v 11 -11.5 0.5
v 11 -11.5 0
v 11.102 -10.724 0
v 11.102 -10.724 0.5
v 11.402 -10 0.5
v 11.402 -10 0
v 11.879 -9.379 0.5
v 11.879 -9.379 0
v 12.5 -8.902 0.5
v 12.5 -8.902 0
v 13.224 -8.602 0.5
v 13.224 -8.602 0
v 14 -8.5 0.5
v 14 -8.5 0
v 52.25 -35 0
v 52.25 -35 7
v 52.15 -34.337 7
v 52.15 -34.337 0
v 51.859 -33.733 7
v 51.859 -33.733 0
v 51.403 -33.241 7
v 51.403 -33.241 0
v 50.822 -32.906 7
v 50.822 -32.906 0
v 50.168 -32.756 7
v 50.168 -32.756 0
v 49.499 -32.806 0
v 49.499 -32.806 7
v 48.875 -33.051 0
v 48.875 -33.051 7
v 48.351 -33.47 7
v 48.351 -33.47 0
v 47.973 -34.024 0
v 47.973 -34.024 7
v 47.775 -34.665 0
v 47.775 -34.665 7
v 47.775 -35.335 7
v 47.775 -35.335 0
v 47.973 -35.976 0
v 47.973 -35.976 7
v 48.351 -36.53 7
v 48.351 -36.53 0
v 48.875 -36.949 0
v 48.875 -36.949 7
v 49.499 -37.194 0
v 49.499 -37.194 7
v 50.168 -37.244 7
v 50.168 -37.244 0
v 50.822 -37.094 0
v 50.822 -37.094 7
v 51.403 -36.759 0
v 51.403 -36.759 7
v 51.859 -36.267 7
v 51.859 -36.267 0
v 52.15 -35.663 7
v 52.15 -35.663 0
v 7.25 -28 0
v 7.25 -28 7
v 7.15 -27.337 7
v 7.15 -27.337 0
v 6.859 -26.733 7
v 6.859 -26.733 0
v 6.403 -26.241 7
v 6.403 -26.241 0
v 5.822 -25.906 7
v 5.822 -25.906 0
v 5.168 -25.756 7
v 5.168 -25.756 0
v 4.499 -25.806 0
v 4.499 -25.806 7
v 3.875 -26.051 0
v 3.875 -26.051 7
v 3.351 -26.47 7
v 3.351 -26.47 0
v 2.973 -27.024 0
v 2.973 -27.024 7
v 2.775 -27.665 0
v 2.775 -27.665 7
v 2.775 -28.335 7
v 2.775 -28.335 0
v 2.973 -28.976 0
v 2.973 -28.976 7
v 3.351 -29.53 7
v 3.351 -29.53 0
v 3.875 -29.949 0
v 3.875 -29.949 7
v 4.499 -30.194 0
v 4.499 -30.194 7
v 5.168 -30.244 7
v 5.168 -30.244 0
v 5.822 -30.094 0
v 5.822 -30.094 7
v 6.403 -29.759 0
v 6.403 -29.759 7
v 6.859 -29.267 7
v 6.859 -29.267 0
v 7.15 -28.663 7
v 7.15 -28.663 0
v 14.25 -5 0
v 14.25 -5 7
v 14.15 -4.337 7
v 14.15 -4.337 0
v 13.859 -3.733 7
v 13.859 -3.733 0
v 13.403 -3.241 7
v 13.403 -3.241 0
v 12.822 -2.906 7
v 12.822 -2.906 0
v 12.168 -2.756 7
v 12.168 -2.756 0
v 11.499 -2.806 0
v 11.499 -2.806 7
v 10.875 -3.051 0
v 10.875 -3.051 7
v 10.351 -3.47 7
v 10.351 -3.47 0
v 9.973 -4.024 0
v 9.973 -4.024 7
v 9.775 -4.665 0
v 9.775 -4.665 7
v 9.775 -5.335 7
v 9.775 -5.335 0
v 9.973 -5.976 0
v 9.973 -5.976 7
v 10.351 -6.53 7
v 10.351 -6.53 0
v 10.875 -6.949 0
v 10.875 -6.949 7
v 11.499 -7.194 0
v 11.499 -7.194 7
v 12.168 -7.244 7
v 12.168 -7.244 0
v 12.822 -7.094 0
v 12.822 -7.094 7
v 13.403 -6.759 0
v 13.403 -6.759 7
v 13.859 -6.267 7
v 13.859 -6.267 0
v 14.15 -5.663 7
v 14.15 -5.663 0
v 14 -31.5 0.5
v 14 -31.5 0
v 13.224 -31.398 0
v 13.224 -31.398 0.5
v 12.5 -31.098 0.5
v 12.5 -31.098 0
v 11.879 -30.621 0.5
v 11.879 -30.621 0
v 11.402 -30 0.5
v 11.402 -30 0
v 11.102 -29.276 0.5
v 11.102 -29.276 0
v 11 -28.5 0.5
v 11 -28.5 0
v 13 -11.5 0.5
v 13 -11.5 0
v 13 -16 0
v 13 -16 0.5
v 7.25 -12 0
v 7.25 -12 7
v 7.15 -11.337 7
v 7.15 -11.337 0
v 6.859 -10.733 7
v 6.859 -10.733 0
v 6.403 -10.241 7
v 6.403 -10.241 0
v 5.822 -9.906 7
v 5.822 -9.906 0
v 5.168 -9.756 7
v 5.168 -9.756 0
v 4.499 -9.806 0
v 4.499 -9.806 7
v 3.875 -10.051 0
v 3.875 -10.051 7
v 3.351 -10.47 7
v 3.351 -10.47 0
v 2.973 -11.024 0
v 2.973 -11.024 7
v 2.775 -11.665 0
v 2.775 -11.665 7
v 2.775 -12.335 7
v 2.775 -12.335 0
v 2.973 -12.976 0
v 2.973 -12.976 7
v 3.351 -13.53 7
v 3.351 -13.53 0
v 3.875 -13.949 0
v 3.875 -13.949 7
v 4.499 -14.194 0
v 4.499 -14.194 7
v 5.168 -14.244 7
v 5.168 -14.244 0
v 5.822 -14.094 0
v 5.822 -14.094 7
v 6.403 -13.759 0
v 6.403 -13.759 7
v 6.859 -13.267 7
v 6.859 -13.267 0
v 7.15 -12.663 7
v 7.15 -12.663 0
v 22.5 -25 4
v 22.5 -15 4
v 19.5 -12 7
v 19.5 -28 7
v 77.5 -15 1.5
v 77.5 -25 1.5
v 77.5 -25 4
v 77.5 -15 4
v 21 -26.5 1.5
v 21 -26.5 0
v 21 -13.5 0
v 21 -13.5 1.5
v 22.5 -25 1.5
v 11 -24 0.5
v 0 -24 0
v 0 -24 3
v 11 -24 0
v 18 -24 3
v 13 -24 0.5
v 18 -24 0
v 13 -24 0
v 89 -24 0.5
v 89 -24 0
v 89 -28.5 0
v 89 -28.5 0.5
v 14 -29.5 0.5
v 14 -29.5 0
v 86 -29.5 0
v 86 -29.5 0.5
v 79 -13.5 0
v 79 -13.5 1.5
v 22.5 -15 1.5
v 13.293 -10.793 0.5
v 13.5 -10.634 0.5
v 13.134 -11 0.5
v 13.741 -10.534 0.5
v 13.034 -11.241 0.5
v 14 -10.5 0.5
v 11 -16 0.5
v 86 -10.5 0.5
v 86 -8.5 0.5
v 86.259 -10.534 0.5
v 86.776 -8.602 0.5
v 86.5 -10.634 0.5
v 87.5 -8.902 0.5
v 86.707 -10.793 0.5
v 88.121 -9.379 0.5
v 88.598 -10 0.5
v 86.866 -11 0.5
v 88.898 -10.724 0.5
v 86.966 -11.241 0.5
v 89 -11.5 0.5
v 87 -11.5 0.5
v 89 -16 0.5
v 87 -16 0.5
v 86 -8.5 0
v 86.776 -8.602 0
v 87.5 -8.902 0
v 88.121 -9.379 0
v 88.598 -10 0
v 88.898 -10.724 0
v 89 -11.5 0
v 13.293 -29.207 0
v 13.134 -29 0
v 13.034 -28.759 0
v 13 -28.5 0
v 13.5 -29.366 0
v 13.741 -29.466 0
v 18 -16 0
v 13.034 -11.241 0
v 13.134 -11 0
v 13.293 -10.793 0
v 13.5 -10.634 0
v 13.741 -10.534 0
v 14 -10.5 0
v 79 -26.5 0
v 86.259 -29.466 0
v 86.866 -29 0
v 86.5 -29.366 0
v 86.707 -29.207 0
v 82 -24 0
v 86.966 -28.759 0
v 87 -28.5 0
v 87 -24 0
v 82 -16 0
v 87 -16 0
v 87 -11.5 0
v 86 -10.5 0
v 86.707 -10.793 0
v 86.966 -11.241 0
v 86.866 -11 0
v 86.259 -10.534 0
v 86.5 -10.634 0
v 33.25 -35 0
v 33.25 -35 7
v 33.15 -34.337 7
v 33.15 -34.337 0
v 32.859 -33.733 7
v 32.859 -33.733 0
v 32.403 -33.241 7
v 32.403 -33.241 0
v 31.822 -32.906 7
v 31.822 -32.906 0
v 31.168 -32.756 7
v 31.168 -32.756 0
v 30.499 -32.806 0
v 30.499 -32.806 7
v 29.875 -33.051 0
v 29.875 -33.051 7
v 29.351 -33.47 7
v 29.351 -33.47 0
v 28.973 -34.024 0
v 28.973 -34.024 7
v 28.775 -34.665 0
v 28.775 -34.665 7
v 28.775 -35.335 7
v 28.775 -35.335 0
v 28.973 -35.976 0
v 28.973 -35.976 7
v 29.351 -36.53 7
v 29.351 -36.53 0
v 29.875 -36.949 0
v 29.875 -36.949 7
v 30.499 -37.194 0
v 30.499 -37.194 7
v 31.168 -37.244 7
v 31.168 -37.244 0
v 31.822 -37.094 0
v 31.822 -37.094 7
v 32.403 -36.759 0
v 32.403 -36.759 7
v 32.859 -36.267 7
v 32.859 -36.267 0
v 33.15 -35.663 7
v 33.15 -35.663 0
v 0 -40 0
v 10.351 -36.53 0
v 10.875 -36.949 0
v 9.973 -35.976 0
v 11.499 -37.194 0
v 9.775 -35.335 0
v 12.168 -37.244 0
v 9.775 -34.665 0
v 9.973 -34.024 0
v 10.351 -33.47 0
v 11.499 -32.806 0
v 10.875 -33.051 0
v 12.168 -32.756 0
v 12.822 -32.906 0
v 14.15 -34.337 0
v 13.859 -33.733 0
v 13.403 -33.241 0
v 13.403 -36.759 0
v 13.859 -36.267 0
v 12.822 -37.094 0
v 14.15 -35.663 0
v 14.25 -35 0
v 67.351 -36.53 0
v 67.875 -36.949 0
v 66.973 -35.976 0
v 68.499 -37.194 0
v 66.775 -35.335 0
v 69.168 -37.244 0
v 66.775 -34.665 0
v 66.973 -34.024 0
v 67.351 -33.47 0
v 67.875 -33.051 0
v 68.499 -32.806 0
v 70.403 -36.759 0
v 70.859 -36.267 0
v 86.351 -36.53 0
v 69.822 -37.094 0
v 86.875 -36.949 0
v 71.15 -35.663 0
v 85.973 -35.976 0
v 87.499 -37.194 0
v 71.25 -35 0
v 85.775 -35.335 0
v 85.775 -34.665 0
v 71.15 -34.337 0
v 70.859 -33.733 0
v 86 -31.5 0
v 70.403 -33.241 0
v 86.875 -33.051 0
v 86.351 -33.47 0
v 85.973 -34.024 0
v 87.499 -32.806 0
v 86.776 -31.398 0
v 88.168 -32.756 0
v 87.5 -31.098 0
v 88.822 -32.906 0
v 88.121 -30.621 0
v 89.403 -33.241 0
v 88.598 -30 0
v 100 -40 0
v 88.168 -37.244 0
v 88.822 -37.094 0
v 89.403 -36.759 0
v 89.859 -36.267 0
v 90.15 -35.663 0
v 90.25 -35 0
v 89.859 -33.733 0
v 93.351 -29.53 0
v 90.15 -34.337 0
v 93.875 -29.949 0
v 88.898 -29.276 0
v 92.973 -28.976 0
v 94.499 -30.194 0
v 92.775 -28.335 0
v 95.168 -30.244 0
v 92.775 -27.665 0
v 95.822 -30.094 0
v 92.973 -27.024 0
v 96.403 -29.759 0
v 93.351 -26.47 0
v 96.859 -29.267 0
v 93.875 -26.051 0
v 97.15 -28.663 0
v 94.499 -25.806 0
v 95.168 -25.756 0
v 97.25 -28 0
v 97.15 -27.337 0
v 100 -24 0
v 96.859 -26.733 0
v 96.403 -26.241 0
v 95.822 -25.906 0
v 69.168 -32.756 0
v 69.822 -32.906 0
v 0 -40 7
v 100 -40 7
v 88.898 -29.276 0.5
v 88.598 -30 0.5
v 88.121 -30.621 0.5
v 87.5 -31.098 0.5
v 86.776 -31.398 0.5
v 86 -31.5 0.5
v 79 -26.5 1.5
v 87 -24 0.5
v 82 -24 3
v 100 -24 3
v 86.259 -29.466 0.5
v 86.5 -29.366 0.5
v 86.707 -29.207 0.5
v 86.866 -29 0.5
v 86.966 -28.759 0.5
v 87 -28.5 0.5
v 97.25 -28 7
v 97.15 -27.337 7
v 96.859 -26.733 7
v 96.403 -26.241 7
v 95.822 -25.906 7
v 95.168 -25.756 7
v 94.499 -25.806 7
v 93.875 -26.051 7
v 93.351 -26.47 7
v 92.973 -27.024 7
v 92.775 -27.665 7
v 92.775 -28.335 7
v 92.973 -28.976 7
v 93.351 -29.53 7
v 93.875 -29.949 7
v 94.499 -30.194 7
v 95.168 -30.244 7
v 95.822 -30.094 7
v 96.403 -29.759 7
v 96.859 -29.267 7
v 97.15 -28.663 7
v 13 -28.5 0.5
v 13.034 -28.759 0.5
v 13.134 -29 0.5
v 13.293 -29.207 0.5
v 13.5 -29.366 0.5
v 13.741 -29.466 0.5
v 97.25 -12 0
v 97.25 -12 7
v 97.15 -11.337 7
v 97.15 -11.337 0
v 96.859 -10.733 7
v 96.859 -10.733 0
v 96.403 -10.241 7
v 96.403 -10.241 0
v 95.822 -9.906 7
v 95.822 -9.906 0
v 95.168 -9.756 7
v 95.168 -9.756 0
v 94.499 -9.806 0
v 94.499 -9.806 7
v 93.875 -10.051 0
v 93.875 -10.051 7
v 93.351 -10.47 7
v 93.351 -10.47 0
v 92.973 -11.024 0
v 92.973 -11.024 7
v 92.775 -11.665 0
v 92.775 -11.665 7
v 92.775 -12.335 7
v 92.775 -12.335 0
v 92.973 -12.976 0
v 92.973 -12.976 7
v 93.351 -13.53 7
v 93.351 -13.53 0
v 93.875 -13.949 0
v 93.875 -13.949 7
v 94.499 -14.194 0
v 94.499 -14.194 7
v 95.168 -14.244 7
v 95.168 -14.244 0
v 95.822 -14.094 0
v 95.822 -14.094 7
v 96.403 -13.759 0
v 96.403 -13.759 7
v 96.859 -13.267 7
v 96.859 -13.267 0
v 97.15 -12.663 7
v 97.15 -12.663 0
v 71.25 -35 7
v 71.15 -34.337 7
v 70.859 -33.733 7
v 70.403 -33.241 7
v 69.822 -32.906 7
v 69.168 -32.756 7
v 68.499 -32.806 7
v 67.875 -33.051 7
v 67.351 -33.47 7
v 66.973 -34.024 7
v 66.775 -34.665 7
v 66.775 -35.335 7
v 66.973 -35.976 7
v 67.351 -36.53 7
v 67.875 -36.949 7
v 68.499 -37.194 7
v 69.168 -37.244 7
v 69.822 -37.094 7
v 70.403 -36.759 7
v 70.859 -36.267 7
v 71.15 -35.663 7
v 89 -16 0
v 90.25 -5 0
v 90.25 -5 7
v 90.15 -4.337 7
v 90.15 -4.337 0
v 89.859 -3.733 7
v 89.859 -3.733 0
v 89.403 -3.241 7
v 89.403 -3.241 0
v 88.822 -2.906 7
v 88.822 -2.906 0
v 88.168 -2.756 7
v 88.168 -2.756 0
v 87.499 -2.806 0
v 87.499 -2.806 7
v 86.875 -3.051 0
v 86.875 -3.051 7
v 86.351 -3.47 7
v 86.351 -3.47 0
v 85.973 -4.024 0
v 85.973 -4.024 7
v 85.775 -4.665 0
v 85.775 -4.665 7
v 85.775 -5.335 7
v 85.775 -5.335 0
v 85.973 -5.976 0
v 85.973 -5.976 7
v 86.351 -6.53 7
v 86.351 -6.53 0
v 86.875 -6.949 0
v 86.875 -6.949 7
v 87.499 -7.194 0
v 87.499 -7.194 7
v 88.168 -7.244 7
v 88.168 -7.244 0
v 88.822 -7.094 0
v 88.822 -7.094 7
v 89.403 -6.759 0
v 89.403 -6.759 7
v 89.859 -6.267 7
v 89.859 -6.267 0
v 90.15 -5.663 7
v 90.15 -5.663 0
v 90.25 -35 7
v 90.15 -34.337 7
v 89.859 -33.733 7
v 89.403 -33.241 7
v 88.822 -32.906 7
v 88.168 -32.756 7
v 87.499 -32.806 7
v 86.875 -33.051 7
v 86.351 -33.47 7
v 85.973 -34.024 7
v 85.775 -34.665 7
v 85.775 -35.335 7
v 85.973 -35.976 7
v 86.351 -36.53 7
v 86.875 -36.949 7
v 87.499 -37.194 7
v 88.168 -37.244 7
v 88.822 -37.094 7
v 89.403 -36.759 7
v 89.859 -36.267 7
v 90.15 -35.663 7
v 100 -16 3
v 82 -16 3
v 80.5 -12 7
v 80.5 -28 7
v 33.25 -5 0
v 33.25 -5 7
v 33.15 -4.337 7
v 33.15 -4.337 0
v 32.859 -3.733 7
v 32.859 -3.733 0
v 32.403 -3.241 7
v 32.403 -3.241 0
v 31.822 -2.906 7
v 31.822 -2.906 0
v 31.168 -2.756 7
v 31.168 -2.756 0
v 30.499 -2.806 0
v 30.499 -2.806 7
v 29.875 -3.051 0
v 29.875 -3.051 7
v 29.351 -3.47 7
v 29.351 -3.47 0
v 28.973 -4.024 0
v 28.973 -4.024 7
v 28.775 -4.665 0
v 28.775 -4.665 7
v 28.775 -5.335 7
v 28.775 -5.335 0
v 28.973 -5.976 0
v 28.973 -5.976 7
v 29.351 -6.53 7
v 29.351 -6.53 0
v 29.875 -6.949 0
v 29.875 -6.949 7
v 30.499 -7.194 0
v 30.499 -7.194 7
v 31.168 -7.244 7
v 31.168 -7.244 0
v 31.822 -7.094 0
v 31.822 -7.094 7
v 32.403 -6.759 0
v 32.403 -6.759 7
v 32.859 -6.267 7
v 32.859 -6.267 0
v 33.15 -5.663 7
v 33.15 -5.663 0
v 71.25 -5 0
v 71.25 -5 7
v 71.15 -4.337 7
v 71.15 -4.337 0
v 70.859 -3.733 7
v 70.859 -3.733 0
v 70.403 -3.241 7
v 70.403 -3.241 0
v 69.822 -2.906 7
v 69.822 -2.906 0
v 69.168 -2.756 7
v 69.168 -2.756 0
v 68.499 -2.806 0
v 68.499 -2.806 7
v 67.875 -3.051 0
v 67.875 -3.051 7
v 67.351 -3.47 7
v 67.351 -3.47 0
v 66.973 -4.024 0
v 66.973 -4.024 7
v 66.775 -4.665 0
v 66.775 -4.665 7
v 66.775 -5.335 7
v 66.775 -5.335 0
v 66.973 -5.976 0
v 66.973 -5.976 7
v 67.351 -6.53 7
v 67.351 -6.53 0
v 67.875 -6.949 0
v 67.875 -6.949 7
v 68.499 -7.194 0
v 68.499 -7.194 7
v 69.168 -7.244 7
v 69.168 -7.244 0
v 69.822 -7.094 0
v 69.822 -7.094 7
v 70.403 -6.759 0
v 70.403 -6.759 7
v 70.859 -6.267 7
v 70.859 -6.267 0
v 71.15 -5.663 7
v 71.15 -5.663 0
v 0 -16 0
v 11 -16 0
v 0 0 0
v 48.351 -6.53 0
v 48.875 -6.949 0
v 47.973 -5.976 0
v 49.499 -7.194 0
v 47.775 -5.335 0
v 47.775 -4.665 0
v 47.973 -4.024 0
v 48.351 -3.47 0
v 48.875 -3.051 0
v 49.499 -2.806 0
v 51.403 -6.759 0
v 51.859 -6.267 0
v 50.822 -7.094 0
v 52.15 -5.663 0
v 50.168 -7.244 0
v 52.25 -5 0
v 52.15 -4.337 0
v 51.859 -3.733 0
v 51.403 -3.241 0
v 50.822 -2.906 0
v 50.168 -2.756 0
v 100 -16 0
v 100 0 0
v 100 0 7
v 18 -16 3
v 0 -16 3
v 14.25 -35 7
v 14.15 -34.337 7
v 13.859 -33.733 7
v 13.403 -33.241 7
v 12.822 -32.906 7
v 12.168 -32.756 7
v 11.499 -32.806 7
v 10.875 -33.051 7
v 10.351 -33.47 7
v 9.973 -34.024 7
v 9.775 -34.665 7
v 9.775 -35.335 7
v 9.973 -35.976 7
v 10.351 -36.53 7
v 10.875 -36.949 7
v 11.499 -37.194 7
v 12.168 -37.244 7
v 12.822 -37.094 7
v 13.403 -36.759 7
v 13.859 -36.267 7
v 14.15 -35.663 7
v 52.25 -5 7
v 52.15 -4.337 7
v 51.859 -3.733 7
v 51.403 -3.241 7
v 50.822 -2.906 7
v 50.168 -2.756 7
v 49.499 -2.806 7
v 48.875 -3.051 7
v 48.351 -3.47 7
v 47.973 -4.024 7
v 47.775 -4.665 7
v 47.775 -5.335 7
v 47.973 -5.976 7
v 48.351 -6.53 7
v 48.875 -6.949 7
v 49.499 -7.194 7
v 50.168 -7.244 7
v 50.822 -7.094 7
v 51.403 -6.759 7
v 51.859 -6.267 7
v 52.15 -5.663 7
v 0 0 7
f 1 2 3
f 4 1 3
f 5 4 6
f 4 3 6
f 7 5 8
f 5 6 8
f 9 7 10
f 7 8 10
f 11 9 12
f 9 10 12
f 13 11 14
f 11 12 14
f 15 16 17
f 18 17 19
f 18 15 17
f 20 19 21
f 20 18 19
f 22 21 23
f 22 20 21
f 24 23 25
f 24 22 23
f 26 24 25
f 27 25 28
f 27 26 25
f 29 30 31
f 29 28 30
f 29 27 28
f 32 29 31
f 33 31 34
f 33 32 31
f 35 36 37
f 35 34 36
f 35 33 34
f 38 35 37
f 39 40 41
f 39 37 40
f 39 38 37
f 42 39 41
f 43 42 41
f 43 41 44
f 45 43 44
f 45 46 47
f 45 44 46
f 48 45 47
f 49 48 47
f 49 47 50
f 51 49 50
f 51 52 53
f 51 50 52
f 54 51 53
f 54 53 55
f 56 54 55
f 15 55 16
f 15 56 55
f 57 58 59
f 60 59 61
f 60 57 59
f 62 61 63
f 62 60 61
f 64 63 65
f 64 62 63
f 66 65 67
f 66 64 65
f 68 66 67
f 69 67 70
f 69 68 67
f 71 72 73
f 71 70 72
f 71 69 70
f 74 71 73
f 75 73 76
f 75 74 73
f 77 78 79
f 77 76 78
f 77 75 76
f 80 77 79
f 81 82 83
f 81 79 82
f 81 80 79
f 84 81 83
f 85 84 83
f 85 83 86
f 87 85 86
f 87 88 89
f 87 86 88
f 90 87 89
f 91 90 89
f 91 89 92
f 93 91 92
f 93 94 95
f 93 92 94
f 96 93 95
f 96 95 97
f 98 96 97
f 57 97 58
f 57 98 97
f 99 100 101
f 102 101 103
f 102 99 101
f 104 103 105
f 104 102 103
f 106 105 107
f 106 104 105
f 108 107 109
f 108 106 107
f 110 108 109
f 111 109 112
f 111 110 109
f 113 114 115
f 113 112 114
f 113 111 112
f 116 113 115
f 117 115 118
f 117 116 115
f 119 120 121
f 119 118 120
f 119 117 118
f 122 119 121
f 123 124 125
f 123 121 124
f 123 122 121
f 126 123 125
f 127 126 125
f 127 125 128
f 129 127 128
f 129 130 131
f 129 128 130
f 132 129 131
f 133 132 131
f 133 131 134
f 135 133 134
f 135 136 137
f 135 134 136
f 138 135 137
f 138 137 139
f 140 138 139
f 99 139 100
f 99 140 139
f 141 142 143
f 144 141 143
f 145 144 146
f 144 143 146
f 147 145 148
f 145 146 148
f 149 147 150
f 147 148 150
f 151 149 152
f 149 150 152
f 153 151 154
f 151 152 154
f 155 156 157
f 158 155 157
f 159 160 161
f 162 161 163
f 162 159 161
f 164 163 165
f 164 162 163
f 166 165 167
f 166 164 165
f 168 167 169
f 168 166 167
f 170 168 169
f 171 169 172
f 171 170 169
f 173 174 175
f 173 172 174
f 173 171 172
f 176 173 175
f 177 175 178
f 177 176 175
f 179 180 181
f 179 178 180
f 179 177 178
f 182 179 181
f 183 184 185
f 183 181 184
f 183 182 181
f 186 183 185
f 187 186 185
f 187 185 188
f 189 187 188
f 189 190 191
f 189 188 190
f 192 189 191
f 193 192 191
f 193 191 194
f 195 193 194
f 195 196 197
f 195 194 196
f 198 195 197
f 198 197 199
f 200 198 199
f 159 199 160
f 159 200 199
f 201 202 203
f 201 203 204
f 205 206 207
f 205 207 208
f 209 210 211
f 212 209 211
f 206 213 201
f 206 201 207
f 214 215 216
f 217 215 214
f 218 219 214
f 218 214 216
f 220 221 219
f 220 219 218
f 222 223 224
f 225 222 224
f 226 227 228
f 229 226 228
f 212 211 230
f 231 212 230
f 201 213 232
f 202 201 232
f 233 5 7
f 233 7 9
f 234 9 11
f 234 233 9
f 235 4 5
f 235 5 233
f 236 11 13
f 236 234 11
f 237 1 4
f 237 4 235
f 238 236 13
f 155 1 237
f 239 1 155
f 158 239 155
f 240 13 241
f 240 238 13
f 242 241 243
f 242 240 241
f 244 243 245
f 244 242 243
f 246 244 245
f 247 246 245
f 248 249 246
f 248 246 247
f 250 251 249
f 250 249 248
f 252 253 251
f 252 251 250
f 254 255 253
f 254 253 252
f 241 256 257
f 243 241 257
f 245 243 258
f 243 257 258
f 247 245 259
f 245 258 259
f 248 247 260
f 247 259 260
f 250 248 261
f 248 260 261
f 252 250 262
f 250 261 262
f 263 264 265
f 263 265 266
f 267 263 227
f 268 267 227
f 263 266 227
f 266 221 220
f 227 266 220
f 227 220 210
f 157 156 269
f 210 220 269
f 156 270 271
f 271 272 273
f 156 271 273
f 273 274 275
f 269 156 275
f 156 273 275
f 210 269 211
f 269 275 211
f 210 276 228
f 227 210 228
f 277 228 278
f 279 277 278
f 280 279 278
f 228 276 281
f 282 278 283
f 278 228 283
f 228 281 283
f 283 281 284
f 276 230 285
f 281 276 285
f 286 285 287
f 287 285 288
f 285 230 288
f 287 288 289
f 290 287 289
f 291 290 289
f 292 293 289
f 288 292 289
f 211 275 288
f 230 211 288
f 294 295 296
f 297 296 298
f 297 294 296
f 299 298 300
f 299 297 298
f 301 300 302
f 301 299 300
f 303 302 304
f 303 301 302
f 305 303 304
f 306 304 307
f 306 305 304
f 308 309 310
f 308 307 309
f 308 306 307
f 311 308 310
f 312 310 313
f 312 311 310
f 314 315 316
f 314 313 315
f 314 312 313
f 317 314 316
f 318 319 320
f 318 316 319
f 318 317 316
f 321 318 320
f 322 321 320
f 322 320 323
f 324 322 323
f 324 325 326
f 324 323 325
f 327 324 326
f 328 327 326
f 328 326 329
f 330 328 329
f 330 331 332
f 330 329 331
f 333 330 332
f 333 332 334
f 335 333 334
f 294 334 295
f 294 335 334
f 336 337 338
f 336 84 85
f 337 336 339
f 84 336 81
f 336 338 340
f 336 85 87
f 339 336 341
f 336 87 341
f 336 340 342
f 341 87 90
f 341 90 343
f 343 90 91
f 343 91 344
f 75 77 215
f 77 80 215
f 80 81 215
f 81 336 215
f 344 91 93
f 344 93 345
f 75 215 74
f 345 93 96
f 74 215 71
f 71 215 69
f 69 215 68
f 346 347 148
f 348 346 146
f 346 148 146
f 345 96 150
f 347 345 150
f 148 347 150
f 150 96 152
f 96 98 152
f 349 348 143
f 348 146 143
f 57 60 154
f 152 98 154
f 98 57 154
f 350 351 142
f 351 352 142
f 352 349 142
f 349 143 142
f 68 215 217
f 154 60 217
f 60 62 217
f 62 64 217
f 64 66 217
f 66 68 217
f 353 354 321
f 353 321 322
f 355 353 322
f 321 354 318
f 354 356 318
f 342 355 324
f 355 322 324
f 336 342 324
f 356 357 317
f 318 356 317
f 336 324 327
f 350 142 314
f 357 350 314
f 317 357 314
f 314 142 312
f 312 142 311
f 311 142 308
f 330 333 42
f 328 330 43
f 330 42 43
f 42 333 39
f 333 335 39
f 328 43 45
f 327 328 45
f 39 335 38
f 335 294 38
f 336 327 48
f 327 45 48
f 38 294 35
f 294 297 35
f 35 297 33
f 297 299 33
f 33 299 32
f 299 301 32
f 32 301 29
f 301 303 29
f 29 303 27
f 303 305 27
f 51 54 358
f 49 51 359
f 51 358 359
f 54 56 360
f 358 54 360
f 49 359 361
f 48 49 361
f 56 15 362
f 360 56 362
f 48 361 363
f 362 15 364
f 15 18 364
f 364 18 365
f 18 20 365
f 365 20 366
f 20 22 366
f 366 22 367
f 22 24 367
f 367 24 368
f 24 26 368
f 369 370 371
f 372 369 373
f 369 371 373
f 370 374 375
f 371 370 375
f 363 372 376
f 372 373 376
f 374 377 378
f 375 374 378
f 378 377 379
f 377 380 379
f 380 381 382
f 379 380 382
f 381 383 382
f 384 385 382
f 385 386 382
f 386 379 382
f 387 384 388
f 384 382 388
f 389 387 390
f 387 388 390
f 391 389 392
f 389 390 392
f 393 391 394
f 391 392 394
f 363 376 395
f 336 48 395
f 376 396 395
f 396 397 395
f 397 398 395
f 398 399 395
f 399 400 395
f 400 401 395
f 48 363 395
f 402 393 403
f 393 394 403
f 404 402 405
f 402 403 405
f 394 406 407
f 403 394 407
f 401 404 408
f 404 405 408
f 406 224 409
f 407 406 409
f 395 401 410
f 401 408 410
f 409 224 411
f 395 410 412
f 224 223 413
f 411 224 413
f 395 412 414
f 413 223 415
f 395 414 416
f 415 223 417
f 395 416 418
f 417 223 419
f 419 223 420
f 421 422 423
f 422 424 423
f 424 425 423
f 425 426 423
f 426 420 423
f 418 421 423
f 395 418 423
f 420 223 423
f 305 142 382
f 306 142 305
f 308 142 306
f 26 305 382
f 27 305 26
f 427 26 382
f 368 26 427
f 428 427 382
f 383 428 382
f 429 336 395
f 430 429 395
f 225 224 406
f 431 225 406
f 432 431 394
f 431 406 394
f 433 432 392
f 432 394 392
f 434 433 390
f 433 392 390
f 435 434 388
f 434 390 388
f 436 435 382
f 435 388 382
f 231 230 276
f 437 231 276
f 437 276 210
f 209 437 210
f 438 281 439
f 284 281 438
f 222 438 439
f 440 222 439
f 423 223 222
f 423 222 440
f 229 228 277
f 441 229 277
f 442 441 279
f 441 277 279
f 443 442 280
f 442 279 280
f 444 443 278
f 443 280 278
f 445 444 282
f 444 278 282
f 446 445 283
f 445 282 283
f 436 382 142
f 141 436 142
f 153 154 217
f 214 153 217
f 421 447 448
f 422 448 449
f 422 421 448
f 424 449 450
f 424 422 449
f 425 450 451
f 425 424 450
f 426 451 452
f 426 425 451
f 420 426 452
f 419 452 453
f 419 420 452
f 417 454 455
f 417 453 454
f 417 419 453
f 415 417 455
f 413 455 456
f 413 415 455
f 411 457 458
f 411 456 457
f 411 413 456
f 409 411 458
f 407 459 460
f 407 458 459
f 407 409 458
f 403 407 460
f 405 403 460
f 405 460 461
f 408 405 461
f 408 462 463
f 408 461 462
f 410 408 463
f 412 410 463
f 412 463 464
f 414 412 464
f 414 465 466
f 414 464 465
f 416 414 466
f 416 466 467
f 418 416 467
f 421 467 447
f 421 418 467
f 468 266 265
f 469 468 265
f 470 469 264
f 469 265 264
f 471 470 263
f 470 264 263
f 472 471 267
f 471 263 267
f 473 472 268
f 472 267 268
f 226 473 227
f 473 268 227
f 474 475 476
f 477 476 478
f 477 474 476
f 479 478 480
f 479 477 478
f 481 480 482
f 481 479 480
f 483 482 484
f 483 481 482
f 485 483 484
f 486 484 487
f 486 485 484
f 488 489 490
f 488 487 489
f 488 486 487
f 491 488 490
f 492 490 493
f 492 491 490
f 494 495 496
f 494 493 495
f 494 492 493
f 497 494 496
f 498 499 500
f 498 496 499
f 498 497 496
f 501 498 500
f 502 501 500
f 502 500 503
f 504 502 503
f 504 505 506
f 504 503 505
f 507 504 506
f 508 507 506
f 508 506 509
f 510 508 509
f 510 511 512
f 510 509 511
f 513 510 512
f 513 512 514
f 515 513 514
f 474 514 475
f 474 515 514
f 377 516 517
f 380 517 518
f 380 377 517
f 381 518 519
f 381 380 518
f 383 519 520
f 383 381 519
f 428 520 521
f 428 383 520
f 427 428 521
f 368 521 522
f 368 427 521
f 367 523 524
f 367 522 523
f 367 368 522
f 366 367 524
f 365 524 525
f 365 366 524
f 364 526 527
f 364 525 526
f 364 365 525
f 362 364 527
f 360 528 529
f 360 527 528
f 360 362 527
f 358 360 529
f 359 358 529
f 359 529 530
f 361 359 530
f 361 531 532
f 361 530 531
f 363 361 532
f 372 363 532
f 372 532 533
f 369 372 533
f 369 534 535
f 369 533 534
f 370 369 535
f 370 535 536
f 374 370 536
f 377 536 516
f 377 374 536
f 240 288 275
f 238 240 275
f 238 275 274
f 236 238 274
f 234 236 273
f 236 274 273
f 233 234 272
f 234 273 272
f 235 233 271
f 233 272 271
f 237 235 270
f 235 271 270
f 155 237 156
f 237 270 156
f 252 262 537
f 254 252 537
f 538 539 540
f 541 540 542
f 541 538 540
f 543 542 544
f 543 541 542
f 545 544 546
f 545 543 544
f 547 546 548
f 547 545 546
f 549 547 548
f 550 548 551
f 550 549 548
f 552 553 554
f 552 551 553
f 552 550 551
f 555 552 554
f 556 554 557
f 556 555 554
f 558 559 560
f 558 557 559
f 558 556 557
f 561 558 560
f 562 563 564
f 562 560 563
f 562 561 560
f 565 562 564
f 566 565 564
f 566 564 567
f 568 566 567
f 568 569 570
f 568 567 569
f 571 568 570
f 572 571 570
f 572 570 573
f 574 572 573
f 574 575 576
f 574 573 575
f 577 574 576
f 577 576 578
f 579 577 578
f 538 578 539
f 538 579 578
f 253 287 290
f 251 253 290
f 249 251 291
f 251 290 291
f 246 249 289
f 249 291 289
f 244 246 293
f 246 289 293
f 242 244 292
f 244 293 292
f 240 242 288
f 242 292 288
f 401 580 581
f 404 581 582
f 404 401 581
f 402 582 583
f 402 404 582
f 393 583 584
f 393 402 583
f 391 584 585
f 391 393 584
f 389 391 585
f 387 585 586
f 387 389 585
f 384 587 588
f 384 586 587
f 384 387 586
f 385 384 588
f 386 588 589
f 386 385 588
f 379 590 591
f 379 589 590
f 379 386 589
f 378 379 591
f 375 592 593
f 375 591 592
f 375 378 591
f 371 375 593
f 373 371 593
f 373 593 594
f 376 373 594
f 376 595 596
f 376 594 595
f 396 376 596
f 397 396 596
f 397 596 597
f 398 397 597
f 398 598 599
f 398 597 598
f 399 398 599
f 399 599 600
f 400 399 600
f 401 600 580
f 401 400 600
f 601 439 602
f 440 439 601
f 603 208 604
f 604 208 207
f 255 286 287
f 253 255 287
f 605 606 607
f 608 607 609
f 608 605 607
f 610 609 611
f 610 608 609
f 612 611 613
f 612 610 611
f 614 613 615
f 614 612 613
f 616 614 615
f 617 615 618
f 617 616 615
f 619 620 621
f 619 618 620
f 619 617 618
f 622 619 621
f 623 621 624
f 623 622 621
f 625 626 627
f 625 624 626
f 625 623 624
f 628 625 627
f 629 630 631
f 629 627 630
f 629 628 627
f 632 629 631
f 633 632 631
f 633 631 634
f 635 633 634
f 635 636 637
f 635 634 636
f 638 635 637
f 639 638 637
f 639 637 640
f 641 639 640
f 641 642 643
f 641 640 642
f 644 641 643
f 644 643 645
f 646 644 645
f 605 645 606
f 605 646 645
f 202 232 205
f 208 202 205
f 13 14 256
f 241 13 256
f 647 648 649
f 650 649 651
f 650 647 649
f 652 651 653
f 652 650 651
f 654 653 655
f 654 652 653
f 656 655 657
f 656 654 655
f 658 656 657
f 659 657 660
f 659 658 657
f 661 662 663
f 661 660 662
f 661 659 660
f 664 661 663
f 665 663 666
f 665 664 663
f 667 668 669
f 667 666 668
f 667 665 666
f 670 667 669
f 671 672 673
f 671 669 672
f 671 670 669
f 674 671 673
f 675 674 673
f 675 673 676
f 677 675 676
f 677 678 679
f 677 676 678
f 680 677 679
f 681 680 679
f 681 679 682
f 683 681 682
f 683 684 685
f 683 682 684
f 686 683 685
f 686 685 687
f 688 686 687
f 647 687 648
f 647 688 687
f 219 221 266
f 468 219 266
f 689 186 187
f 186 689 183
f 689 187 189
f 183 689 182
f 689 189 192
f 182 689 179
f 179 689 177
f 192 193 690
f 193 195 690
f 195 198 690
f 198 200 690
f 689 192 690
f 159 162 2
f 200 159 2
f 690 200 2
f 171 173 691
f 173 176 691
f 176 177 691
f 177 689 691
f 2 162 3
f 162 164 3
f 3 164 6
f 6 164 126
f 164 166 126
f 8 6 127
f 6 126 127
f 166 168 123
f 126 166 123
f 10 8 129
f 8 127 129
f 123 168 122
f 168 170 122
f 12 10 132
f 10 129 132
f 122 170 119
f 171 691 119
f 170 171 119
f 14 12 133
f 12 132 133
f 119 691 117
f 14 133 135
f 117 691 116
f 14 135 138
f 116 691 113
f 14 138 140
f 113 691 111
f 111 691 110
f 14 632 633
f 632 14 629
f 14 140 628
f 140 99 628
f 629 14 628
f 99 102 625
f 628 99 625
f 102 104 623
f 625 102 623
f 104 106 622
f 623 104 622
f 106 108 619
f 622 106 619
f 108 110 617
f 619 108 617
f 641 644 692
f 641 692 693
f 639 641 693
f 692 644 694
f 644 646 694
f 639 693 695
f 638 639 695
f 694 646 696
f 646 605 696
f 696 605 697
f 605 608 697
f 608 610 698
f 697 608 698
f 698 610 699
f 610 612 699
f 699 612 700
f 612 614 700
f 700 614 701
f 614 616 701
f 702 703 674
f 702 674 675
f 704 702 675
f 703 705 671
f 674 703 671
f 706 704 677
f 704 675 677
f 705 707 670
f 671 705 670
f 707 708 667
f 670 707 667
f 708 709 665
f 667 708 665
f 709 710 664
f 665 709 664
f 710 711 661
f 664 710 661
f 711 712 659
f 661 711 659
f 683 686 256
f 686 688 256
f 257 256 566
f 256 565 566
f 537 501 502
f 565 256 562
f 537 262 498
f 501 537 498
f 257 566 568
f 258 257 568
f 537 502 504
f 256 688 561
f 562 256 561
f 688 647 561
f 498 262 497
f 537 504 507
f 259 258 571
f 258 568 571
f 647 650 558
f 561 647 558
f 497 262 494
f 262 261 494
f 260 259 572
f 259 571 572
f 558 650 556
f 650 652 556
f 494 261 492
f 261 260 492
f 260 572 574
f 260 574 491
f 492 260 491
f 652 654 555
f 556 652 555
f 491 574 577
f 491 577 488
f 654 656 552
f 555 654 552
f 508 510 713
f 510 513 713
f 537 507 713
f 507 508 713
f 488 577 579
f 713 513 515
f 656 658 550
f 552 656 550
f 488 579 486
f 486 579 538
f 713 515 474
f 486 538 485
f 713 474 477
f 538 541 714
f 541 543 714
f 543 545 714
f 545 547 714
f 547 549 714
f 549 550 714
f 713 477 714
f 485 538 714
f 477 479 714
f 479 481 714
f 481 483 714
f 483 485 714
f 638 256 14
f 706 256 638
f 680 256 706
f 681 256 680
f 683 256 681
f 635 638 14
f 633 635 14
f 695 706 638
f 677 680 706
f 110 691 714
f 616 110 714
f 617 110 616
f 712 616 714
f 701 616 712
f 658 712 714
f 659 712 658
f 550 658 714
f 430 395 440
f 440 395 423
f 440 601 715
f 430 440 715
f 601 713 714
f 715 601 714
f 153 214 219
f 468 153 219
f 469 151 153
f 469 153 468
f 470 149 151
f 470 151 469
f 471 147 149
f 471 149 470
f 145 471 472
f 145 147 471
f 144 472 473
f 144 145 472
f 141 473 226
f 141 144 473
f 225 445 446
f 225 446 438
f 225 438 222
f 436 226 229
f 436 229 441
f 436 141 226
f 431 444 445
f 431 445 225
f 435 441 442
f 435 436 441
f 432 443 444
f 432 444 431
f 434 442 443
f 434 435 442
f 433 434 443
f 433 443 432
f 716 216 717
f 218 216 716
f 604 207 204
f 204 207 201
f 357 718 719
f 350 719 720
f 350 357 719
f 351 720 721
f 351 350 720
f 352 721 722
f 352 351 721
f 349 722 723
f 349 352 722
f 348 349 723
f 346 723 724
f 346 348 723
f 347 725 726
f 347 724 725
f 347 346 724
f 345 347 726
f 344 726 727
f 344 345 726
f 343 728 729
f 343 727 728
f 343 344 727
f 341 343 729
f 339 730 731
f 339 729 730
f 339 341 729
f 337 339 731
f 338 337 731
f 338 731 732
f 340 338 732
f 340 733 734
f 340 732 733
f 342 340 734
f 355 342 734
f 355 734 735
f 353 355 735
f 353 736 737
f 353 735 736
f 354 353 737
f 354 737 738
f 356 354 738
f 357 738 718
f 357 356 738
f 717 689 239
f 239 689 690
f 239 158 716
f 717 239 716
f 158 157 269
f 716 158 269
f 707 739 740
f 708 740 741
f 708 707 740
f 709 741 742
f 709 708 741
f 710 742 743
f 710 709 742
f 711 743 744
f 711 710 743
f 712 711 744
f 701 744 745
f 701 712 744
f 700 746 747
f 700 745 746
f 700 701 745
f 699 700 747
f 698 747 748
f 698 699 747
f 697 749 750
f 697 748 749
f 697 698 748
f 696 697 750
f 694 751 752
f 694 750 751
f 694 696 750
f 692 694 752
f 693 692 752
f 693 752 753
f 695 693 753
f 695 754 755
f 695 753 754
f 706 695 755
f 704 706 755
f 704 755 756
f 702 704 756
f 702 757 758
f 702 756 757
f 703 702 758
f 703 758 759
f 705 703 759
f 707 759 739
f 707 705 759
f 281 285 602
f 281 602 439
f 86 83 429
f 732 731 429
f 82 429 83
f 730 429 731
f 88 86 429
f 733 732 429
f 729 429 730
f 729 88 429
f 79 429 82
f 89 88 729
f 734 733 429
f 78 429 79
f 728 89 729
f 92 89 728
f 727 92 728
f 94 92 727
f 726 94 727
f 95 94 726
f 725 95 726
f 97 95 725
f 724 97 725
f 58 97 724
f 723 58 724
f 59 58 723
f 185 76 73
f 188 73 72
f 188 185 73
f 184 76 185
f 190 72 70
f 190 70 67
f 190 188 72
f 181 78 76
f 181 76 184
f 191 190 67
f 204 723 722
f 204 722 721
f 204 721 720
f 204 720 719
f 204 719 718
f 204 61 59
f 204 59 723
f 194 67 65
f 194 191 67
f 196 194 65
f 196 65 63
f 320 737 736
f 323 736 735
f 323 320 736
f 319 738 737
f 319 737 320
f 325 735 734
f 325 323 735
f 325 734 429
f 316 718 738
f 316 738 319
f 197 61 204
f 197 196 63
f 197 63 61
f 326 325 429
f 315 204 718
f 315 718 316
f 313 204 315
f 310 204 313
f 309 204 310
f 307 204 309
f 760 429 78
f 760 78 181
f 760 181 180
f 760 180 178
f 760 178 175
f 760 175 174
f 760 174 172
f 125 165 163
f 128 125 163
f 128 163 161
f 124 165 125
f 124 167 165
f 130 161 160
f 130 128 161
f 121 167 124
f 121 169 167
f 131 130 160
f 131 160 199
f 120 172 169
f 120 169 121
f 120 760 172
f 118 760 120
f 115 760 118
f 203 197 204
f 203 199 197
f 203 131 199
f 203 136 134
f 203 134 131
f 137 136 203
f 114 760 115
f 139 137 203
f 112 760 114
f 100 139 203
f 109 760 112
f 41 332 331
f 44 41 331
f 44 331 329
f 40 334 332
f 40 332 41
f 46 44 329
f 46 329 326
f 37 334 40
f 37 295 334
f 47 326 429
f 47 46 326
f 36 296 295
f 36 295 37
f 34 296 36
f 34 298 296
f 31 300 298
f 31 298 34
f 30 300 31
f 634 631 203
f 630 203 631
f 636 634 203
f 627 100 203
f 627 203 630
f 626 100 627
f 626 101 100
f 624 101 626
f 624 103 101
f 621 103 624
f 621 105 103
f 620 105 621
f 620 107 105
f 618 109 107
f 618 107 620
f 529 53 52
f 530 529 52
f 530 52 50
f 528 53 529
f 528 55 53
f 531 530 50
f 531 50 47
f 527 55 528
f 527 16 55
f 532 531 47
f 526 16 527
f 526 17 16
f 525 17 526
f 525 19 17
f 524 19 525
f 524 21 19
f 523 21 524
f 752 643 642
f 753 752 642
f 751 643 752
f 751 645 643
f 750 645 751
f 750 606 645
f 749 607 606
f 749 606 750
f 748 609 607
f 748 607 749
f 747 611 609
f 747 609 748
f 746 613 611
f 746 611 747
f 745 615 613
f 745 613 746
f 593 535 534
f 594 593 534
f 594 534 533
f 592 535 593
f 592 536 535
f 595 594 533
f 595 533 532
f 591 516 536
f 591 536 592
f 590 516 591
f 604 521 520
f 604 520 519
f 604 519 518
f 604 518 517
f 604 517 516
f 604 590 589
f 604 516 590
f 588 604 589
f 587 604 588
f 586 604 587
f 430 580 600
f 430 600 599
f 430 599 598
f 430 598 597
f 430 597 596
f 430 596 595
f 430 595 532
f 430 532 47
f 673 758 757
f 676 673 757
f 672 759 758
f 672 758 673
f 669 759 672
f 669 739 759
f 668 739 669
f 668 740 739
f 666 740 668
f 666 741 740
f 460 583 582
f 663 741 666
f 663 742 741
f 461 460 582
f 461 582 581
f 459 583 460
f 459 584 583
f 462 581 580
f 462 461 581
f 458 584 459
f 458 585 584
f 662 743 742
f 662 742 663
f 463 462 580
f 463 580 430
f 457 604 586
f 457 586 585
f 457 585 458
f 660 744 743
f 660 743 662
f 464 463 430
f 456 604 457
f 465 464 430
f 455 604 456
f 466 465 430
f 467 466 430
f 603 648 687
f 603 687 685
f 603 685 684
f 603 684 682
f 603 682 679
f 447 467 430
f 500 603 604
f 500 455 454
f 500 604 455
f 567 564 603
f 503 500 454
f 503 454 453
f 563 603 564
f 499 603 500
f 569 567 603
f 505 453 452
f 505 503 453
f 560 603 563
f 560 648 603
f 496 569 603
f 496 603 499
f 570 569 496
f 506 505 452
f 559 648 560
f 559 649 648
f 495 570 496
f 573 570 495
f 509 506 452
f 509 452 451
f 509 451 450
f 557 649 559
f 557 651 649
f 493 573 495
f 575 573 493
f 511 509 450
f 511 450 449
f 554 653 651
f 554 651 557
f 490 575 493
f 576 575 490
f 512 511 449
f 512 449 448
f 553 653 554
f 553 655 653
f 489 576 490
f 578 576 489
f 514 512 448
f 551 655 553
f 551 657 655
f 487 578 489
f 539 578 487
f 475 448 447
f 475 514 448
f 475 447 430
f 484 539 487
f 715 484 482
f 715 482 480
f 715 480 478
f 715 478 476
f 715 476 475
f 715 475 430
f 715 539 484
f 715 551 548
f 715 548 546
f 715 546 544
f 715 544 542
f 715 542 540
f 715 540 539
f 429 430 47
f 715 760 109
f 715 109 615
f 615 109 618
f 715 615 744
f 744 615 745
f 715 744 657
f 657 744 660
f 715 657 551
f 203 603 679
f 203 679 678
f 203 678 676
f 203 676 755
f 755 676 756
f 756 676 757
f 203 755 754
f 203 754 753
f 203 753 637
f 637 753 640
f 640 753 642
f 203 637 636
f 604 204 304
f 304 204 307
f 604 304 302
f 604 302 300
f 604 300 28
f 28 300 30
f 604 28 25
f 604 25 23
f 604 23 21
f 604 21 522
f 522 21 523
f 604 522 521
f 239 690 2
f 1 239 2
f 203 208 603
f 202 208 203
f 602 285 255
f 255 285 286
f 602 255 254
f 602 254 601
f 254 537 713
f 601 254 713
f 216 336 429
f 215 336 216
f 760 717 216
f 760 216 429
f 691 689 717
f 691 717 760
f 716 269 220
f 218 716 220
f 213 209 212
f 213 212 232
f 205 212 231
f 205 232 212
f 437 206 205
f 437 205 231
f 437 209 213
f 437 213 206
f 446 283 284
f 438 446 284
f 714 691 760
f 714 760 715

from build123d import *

# Parameters (mm, degrees)
F0_W      = 100
F0_H      = 40
F1_DEPTH  = 7
F2_W      = 55
F2_H      = 10
F3_DEPTH  = 8
F4_SIZE   = 3
F5_R      = 2.25
F6_DEPTH  = 18.9
F7_W      = 18
F7_H      = 8
F8_DEPTH  = 3
F9_W      = 55
F9_H      = 10
F10_DEPTH = 1.5
F12_DEPTH = 0.5


# Not quite as in the source:
# - a feature names something its author has since deleted; it is built from what else it names


with BuildPart() as f1:
    # F0 (on Top) → F1 (new body)
    with BuildSketch(Plane.XY):
        with Locations((50, -20)):
            Rectangle(F0_W, F0_H)
    extrude(amount=F1_DEPTH)

    # F2 (on Top) → F3 (cut)
    with BuildSketch(Plane.XY):
        with Locations((50, -20)):
            Rectangle(F2_W, F2_H)
    extrude(amount=F3_DEPTH, mode=Mode.SUBTRACT)

    # F4
    f4_edges = [f1.edges().sort_by_distance(p)[0] for p in [
        (50, -15, 7),
        (22.5, -20, 7),
        (50, -25, 7),
        (77.5, -20, 7),
    ]]
    chamfer(f4_edges, length=F4_SIZE)

    # F5 (on Top) → F6 (cut)
    with BuildSketch(Plane.XY):
        with Locations((12, -35)):
            Circle(F5_R)
        with Locations((31, -35)):
            Circle(F5_R)
        with Locations((50, -35)):
            Circle(F5_R)
        with Locations((69, -35)):
            Circle(F5_R)
        with Locations((88, -35)):
            Circle(F5_R)
        with Locations((95, -28)):
            Circle(F5_R)
        with Locations((95, -12)):
            Circle(F5_R)
        with Locations((88, -5)):
            Circle(F5_R)
        with Locations((69, -5)):
            Circle(F5_R)
        with Locations((50, -5)):
            Circle(F5_R)
        with Locations((31, -5)):
            Circle(F5_R)
        with Locations((12, -5)):
            Circle(F5_R)
        with Locations((5, -12)):
            Circle(F5_R)
        with Locations((5, -28)):
            Circle(F5_R)
    extrude(amount=F6_DEPTH, mode=Mode.SUBTRACT)

    # F7 (on face) → F8 (cut)
    with BuildSketch(Plane(origin=(0, 0, 0), x_dir=(1, 0, 0), z_dir=(0, 0, -1))):
        with Locations((9, 20)):
            Rectangle(F7_W, F7_H)
        with Locations((91, 20)):
            Rectangle(F7_W, F7_H)
    extrude(amount=-F8_DEPTH, mode=Mode.SUBTRACT)

    # F9 (on face) → F10 (cut)
    with BuildSketch(Plane(origin=(0, 0, 0), x_dir=(1, 0, 0), z_dir=(0, 0, -1))):
        Polygon((21, 13.5), (77.5, 13.5), (79, 13.5), (79, 26.5), (21, 26.5), align=None)
        with Locations((50, 20)):
            Rectangle(F9_W, F9_H, mode=Mode.SUBTRACT)
    extrude(amount=-F10_DEPTH, mode=Mode.SUBTRACT)

    # F11 (on face) → F12 (cut)
    with BuildSketch(Plane(origin=(0, 0, 0), x_dir=(1, 0, 0), z_dir=(0, 0, -1))):
        with BuildLine():
            Line((14, 8.5), (16, 8.5))
            Line((16, 8.5), (84, 8.5))
            Line((84, 8.5), (86, 8.5))
            ThreePointArc((86, 8.5), (88.1213203436, 9.3786796564), (89, 11.5))
            Line((89, 11.5), (89, 16))
            Line((89, 16), (87, 16))
            Line((87, 16), (87, 11.5))
            ThreePointArc((87, 11.5), (86.7071067812, 10.7928932188), (86, 10.5))
            Line((86, 10.5), (84, 10.5))
            Line((84, 10.5), (16, 10.5))
            Line((16, 10.5), (14, 10.5))
            ThreePointArc((14, 10.5), (13.2928932188, 10.7928932188), (13, 11.5))
            Line((13, 11.5), (13, 16))
            Line((13, 16), (11, 16))
            Line((11, 16), (11, 11.5))
            ThreePointArc((11, 11.5), (11.8786796564, 9.3786796564), (14, 8.5))
        make_face()
        with BuildLine():
            Line((11, 28.5), (11, 24))
            Line((11, 24), (13, 24))
            Line((13, 24), (13, 28.5))
            ThreePointArc((13, 28.5), (13.2928932188, 29.2071067812), (14, 29.5))
            Line((14, 29.5), (16, 29.5))
            Line((16, 29.5), (84, 29.5))
            Line((84, 29.5), (86, 29.5))
            ThreePointArc((86, 29.5), (86.7071067812, 29.2071067812), (87, 28.5))
            Line((87, 28.5), (87, 24))
            Line((87, 24), (89, 24))
            Line((89, 24), (89, 28.5))
            ThreePointArc((89, 28.5), (88.1213203436, 30.6213203436), (86, 31.5))
            Line((86, 31.5), (84, 31.5))
            Line((84, 31.5), (16, 31.5))
            Line((16, 31.5), (14, 31.5))
            ThreePointArc((14, 31.5), (11.8786796564, 30.6213203436), (11, 28.5))
        make_face()
    extrude(amount=-F12_DEPTH, mode=Mode.SUBTRACT)


solid = f1.part
